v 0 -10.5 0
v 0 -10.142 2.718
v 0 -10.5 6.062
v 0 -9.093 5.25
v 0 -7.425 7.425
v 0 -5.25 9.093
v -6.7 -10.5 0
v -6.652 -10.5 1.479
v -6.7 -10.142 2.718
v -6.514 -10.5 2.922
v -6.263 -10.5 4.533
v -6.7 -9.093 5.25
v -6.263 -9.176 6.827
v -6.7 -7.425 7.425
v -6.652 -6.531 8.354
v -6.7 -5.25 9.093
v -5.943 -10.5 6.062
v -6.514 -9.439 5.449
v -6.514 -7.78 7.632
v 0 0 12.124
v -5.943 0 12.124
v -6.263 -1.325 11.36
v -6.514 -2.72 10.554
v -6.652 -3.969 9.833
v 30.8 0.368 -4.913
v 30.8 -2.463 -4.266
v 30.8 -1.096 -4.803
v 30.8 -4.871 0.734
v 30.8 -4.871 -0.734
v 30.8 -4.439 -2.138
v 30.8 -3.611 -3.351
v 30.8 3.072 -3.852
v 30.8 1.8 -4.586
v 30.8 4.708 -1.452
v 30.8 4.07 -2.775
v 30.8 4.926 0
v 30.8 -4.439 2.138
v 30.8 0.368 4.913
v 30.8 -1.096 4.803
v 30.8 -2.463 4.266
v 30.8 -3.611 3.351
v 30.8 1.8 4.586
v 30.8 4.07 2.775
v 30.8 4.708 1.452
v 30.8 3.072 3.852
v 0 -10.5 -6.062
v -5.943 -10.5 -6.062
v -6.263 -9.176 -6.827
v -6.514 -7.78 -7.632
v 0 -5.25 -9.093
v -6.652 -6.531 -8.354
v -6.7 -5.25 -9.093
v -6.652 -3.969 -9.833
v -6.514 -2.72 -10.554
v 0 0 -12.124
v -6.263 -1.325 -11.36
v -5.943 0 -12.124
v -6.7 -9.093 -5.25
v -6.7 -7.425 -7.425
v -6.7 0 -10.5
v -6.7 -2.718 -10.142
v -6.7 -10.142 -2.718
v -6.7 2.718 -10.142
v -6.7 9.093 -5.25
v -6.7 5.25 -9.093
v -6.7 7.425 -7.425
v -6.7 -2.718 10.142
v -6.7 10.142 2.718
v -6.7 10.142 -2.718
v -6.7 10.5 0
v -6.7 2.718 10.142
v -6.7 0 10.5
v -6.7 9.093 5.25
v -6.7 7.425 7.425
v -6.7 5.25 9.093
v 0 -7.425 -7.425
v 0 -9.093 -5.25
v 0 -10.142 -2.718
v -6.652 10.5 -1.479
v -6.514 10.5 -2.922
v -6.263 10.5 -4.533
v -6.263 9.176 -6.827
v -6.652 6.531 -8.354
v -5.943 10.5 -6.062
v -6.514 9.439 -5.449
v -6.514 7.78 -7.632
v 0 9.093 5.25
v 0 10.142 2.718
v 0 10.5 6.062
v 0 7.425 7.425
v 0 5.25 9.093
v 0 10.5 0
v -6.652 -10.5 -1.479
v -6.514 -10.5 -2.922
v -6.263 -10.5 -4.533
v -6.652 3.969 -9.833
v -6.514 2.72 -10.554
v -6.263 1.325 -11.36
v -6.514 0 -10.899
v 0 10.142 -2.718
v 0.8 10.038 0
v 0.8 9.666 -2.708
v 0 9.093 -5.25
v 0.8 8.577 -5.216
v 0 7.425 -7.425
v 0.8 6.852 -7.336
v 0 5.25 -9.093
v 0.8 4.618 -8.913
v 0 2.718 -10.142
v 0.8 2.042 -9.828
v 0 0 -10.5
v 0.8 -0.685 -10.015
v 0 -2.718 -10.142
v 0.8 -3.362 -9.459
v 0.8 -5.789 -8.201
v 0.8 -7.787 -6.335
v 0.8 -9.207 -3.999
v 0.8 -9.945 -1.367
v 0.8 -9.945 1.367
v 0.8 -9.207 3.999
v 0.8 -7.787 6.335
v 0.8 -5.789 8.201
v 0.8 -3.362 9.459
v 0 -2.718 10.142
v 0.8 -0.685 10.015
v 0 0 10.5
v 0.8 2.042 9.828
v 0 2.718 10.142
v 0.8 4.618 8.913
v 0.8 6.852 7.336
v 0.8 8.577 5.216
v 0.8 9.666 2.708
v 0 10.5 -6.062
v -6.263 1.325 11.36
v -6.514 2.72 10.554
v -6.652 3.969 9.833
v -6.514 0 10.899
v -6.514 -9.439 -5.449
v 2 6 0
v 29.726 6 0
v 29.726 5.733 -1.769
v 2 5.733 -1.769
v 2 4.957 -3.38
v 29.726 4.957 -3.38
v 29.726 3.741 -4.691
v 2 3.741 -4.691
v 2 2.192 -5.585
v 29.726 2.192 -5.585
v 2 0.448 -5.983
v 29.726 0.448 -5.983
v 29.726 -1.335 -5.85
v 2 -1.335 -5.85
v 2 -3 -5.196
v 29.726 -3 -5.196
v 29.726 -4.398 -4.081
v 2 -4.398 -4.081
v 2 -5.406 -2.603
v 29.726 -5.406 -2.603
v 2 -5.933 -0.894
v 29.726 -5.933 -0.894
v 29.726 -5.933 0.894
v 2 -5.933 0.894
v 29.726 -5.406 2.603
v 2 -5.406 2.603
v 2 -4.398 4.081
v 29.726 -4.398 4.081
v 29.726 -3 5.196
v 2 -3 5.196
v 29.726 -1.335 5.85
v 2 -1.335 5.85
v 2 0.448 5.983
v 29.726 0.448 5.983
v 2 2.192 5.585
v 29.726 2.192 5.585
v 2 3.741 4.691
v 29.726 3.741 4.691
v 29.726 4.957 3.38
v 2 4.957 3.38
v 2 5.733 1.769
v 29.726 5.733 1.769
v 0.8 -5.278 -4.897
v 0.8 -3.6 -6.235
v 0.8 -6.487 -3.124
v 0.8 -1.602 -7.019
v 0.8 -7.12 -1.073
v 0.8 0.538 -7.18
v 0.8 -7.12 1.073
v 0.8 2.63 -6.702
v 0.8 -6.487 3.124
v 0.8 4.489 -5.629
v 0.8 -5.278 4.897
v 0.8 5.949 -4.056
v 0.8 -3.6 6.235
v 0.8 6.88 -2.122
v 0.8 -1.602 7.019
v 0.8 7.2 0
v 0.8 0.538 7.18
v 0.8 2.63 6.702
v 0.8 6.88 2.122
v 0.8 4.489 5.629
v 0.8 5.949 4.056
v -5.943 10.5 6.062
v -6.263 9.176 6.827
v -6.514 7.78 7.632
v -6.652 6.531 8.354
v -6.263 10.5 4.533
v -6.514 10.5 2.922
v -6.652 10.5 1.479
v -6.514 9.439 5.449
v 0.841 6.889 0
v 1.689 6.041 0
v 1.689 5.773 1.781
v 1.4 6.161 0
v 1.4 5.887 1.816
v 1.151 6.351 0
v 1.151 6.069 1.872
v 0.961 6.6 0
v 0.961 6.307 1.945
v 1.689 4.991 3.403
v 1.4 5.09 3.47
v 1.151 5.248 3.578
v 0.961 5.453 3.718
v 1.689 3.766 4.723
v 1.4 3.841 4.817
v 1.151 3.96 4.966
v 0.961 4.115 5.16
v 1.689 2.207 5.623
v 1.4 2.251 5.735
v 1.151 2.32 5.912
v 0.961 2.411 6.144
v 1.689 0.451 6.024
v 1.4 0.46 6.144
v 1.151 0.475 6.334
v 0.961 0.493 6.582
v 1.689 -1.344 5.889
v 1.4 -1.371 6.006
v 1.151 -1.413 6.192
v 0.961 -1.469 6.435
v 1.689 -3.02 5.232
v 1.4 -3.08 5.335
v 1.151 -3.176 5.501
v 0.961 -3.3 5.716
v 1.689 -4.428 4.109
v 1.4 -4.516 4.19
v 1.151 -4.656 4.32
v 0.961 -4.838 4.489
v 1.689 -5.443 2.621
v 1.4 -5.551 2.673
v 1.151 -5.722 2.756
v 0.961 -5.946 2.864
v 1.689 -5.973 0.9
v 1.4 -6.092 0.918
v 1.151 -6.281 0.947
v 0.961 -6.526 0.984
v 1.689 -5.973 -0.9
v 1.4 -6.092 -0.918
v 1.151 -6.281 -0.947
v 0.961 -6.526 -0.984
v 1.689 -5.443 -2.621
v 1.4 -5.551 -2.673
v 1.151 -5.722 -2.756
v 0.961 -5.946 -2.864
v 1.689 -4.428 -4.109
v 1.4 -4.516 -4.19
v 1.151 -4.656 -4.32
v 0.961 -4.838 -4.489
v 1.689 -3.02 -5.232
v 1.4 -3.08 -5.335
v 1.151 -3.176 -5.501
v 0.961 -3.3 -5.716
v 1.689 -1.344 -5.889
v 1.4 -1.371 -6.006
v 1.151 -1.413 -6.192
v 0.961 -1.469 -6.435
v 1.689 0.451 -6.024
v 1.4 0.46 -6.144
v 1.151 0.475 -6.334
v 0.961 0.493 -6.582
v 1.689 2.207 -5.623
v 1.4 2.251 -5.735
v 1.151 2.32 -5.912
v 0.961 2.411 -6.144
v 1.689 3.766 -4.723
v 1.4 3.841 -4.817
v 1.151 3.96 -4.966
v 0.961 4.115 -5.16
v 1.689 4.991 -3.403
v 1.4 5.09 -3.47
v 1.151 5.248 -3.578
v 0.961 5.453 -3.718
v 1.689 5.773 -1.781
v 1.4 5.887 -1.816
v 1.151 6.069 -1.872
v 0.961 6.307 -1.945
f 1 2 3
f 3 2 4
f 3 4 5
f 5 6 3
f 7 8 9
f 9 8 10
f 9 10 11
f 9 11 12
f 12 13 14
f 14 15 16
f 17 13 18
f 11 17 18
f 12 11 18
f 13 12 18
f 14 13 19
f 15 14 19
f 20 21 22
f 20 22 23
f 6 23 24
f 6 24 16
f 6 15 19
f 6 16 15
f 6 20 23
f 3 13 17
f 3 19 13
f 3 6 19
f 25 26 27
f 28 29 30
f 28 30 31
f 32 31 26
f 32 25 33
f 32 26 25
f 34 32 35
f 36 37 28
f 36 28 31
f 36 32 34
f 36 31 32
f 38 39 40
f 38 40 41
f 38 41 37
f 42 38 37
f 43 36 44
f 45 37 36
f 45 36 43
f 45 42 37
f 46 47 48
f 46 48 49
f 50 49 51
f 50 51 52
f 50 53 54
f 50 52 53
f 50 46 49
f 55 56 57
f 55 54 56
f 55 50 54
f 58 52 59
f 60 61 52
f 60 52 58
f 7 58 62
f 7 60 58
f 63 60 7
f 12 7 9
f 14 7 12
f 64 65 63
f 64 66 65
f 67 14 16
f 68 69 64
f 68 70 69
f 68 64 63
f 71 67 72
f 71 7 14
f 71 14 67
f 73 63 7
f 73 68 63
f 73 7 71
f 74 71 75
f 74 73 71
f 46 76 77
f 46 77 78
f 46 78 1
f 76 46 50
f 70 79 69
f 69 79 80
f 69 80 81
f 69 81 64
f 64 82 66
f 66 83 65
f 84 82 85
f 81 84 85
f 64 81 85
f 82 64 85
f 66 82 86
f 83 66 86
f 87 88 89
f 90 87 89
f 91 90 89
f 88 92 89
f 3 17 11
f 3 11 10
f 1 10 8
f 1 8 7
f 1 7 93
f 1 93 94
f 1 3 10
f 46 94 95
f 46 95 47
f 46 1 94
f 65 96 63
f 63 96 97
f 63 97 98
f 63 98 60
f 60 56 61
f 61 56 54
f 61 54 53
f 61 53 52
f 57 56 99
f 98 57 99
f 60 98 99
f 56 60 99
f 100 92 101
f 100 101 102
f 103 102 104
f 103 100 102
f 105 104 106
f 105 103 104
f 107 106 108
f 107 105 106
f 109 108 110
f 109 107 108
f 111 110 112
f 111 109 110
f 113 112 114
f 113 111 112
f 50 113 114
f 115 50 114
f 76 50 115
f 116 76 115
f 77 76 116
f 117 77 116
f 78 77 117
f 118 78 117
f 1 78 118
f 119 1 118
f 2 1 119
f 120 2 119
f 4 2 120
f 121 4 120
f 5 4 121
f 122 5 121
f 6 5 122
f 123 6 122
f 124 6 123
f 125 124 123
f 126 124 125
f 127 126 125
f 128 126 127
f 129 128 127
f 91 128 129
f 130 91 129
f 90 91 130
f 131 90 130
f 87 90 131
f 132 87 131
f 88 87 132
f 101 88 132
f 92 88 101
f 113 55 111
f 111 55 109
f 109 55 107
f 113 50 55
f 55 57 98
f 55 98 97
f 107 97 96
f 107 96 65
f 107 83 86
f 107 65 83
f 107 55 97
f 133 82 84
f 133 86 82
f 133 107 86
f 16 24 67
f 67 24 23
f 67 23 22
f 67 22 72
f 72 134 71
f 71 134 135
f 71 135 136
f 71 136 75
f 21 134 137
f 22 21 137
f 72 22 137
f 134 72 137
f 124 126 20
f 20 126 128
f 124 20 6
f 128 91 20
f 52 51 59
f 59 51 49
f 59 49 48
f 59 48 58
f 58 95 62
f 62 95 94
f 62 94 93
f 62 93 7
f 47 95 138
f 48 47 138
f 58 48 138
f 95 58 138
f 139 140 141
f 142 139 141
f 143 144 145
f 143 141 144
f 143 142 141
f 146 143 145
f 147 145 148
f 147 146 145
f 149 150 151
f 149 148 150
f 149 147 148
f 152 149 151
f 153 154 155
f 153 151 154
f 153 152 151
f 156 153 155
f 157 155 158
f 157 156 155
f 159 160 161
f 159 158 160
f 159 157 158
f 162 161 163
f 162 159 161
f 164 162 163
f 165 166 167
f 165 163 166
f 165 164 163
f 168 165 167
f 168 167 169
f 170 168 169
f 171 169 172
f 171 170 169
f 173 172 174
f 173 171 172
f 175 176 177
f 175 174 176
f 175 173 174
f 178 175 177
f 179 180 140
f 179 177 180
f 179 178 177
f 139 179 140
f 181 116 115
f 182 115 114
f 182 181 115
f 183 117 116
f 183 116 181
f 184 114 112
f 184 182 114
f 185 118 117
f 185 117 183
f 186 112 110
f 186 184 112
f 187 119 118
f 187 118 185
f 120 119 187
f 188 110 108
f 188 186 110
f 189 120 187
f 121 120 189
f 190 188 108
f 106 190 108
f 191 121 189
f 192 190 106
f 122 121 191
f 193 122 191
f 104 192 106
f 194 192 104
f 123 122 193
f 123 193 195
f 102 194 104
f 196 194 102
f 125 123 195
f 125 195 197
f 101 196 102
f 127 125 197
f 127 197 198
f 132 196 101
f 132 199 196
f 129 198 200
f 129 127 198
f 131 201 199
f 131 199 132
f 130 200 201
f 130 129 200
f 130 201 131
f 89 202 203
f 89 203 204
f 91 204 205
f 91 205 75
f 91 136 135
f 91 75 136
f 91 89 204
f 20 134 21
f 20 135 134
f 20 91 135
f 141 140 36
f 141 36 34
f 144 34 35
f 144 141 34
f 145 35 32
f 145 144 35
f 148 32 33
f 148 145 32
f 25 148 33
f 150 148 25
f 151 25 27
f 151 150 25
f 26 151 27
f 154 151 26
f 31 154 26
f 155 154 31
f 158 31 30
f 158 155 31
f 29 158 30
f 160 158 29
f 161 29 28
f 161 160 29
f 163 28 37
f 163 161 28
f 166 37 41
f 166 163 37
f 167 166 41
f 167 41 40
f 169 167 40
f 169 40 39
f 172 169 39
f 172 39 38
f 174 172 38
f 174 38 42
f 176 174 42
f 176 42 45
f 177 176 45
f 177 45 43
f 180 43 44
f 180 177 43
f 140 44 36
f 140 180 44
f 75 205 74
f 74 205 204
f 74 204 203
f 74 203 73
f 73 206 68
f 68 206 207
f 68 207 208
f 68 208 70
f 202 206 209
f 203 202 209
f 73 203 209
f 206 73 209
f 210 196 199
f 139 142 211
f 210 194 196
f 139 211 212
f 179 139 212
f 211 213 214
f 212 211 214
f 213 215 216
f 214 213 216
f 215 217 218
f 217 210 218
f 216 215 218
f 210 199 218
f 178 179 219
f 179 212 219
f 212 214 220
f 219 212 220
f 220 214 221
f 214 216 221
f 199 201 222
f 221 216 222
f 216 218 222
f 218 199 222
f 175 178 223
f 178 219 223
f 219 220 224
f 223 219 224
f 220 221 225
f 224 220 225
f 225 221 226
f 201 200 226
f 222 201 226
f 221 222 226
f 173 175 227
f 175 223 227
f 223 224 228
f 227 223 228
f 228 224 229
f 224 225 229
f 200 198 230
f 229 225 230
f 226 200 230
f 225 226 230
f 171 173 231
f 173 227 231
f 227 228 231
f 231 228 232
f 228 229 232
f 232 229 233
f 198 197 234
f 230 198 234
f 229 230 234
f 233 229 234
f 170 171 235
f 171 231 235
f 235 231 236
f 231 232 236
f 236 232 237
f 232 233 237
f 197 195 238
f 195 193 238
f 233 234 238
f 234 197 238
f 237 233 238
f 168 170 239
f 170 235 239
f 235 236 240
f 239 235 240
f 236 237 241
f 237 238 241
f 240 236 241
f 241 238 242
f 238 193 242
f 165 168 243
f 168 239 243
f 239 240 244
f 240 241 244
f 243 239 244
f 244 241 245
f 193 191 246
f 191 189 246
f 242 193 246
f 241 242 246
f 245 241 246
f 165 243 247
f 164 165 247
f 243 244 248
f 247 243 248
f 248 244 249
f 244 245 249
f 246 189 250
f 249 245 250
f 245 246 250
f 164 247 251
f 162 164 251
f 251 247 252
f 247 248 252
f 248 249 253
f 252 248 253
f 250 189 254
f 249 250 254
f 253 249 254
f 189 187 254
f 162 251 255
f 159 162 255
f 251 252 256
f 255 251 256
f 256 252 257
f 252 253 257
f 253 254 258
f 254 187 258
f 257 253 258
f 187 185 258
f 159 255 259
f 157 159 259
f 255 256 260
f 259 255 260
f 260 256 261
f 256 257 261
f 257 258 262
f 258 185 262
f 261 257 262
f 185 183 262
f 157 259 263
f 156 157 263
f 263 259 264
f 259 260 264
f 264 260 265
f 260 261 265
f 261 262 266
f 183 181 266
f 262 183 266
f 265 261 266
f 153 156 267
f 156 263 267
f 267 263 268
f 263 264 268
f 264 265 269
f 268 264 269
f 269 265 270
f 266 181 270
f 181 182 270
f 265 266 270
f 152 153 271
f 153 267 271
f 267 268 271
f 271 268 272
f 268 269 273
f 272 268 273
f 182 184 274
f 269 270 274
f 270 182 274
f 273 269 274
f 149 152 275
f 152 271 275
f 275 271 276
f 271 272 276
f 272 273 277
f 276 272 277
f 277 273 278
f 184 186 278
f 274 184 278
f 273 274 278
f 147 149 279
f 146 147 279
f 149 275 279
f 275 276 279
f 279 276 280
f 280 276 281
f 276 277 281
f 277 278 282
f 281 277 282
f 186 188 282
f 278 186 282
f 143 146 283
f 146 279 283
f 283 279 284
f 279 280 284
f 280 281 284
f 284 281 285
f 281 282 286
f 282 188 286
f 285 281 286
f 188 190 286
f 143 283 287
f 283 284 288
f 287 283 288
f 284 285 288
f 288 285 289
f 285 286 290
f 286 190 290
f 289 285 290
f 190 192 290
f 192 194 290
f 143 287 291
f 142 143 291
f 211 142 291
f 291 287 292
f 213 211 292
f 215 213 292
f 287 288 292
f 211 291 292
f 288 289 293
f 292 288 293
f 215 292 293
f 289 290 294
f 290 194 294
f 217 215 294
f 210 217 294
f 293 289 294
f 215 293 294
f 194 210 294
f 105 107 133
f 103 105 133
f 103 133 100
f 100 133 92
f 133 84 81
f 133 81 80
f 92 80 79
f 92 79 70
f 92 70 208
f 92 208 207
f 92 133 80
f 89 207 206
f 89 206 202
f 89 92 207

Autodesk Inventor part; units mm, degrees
ref_plane "YZ Plane" through (0, 0, 0) normal (1, 0, 0) x (0, 1, 0)
ref_plane "XZ Plane" through (0, 0, 0) normal (0, 1, 0) x (-1, 0, 0)
sketch "草图4" plane through (0, 0, 0) normal (0, 0, 1) x (1, 0, 0)
  line L0 (0, 0) -> (0, 10.5)
  line L1 (0, 10.5) -> (0.8, 10.0381)
  line L2 (0.8, 10.0381) -> (0.8, 0)
  line L3 (0.8, 0) -> (0, 0)
  line L4 (0, 0) -> (10.723, 0)
  line L5 (0.8, 0) -> (30.8, 0)
  line L6 (30.8, 0) -> (30.8, 6)
  line L7 (30.8, 6) -> (0.8, 6)
  line L8 (0.8, 6) -> (0.8, 0)
  dimension "INC" = 0.8
  dimension "d22" = 60
  dimension "L" = 30
  dimension "D" = 12
  dimension "INS" = 21
revolve "Revolution3" add sketch "草图4" angle 360 about axis through (0, 0, 0) along (1, 0, 0)
sketch "草图5" plane through (0, 0, 0) normal (-1, 0, 0) x (0, 0, 1)
  line L0 (-6.0622, 10.5) -> (6.0622, 10.5)
  line L1 (6.0622, 10.5) -> (12.1244, 0)
  line L2 (12.1244, 0) -> (6.0622, -10.5)
  line L3 (6.0622, -10.5) -> (-6.0622, -10.5)
  line L4 (-6.0622, -10.5) -> (-12.1244, 0)
  line L5 (-12.1244, 0) -> (-6.0622, 10.5)
  point P0 (0, 0)
  point P1 (0, 0)
  dimension "d27" = 21
extrude "Extrusion2" add sketch "草图5" along normal blind 6.7
ref_plane "Work Plane1" through (0, 10.5, -6.0622) normal (0, 0.5, 0.8660254) x (-1, 0, 0)
sketch "草图6" plane through (0, 10.5, -6.0622) normal (0, 0.5, 0.8660254) x (-1, 0, 0)
  line L0 (0, 12.1244) -> (11.8845, 12.1244) construction
  line L1 (6.7, 6.0622) -> (6.7, 0) projected
  line L2 (0, 3.0311) -> (0, 0) projected
  line L3 (6.7, 6.0622) -> (6.7, 0) projected
  line L4 (0, 0) -> (6.7, 0) projected
  line L5 (0, 3.0311) -> (0, 0) projected
  line L6 (0, 6.0622) -> (0, 3.0311) projected
  line L7 (0, 6.0622) -> (6.7, 6.0622) projected
  line L8 (6.7, 1.6244) -> (5.9426, 0)
  dimension "d30" = 25
  dimension "d31" = 21
revolve "Revolution4" cut sketch "草图6" angle 360 about axis through (0, 0, 0) along (-1, 0, 0) contours L1 L4 L8
thread "Thread2" size "M12x1.75" designation "M12" class "6g" standard "GB Metric profile" length 30
chamfer "Chamfer2" distance 1.0735 angle 45 1 edges at (30.8, -6, 0)
fillet "Fillet1" radius 1.2 1 edges at (0.8, -6, 0)
equation "\"d27\" = INS"
equation "\"d28\" = KOH - INC"
equation "\"d33\" = NLG - LS"
equation "\"d35\" = GUL"
equation "\"L\" = NLG"
equation "\"D\" = NND"
equation "\"d31\" = INS"
equation "\"NND\" = 12"
equation "\"NLG\" = 30"
equation "\"PTC\" = 1.75"
equation "\"KOD\" = 1"
equation "\"KOH\" = 7.5"
equation "\"GUL\" = 0.61345 * PTC"
equation "\"LS\" = 0"
properties part number "Bolt GB/T 18230.2-2000 M12 x 30" material "Steel, Mild"
